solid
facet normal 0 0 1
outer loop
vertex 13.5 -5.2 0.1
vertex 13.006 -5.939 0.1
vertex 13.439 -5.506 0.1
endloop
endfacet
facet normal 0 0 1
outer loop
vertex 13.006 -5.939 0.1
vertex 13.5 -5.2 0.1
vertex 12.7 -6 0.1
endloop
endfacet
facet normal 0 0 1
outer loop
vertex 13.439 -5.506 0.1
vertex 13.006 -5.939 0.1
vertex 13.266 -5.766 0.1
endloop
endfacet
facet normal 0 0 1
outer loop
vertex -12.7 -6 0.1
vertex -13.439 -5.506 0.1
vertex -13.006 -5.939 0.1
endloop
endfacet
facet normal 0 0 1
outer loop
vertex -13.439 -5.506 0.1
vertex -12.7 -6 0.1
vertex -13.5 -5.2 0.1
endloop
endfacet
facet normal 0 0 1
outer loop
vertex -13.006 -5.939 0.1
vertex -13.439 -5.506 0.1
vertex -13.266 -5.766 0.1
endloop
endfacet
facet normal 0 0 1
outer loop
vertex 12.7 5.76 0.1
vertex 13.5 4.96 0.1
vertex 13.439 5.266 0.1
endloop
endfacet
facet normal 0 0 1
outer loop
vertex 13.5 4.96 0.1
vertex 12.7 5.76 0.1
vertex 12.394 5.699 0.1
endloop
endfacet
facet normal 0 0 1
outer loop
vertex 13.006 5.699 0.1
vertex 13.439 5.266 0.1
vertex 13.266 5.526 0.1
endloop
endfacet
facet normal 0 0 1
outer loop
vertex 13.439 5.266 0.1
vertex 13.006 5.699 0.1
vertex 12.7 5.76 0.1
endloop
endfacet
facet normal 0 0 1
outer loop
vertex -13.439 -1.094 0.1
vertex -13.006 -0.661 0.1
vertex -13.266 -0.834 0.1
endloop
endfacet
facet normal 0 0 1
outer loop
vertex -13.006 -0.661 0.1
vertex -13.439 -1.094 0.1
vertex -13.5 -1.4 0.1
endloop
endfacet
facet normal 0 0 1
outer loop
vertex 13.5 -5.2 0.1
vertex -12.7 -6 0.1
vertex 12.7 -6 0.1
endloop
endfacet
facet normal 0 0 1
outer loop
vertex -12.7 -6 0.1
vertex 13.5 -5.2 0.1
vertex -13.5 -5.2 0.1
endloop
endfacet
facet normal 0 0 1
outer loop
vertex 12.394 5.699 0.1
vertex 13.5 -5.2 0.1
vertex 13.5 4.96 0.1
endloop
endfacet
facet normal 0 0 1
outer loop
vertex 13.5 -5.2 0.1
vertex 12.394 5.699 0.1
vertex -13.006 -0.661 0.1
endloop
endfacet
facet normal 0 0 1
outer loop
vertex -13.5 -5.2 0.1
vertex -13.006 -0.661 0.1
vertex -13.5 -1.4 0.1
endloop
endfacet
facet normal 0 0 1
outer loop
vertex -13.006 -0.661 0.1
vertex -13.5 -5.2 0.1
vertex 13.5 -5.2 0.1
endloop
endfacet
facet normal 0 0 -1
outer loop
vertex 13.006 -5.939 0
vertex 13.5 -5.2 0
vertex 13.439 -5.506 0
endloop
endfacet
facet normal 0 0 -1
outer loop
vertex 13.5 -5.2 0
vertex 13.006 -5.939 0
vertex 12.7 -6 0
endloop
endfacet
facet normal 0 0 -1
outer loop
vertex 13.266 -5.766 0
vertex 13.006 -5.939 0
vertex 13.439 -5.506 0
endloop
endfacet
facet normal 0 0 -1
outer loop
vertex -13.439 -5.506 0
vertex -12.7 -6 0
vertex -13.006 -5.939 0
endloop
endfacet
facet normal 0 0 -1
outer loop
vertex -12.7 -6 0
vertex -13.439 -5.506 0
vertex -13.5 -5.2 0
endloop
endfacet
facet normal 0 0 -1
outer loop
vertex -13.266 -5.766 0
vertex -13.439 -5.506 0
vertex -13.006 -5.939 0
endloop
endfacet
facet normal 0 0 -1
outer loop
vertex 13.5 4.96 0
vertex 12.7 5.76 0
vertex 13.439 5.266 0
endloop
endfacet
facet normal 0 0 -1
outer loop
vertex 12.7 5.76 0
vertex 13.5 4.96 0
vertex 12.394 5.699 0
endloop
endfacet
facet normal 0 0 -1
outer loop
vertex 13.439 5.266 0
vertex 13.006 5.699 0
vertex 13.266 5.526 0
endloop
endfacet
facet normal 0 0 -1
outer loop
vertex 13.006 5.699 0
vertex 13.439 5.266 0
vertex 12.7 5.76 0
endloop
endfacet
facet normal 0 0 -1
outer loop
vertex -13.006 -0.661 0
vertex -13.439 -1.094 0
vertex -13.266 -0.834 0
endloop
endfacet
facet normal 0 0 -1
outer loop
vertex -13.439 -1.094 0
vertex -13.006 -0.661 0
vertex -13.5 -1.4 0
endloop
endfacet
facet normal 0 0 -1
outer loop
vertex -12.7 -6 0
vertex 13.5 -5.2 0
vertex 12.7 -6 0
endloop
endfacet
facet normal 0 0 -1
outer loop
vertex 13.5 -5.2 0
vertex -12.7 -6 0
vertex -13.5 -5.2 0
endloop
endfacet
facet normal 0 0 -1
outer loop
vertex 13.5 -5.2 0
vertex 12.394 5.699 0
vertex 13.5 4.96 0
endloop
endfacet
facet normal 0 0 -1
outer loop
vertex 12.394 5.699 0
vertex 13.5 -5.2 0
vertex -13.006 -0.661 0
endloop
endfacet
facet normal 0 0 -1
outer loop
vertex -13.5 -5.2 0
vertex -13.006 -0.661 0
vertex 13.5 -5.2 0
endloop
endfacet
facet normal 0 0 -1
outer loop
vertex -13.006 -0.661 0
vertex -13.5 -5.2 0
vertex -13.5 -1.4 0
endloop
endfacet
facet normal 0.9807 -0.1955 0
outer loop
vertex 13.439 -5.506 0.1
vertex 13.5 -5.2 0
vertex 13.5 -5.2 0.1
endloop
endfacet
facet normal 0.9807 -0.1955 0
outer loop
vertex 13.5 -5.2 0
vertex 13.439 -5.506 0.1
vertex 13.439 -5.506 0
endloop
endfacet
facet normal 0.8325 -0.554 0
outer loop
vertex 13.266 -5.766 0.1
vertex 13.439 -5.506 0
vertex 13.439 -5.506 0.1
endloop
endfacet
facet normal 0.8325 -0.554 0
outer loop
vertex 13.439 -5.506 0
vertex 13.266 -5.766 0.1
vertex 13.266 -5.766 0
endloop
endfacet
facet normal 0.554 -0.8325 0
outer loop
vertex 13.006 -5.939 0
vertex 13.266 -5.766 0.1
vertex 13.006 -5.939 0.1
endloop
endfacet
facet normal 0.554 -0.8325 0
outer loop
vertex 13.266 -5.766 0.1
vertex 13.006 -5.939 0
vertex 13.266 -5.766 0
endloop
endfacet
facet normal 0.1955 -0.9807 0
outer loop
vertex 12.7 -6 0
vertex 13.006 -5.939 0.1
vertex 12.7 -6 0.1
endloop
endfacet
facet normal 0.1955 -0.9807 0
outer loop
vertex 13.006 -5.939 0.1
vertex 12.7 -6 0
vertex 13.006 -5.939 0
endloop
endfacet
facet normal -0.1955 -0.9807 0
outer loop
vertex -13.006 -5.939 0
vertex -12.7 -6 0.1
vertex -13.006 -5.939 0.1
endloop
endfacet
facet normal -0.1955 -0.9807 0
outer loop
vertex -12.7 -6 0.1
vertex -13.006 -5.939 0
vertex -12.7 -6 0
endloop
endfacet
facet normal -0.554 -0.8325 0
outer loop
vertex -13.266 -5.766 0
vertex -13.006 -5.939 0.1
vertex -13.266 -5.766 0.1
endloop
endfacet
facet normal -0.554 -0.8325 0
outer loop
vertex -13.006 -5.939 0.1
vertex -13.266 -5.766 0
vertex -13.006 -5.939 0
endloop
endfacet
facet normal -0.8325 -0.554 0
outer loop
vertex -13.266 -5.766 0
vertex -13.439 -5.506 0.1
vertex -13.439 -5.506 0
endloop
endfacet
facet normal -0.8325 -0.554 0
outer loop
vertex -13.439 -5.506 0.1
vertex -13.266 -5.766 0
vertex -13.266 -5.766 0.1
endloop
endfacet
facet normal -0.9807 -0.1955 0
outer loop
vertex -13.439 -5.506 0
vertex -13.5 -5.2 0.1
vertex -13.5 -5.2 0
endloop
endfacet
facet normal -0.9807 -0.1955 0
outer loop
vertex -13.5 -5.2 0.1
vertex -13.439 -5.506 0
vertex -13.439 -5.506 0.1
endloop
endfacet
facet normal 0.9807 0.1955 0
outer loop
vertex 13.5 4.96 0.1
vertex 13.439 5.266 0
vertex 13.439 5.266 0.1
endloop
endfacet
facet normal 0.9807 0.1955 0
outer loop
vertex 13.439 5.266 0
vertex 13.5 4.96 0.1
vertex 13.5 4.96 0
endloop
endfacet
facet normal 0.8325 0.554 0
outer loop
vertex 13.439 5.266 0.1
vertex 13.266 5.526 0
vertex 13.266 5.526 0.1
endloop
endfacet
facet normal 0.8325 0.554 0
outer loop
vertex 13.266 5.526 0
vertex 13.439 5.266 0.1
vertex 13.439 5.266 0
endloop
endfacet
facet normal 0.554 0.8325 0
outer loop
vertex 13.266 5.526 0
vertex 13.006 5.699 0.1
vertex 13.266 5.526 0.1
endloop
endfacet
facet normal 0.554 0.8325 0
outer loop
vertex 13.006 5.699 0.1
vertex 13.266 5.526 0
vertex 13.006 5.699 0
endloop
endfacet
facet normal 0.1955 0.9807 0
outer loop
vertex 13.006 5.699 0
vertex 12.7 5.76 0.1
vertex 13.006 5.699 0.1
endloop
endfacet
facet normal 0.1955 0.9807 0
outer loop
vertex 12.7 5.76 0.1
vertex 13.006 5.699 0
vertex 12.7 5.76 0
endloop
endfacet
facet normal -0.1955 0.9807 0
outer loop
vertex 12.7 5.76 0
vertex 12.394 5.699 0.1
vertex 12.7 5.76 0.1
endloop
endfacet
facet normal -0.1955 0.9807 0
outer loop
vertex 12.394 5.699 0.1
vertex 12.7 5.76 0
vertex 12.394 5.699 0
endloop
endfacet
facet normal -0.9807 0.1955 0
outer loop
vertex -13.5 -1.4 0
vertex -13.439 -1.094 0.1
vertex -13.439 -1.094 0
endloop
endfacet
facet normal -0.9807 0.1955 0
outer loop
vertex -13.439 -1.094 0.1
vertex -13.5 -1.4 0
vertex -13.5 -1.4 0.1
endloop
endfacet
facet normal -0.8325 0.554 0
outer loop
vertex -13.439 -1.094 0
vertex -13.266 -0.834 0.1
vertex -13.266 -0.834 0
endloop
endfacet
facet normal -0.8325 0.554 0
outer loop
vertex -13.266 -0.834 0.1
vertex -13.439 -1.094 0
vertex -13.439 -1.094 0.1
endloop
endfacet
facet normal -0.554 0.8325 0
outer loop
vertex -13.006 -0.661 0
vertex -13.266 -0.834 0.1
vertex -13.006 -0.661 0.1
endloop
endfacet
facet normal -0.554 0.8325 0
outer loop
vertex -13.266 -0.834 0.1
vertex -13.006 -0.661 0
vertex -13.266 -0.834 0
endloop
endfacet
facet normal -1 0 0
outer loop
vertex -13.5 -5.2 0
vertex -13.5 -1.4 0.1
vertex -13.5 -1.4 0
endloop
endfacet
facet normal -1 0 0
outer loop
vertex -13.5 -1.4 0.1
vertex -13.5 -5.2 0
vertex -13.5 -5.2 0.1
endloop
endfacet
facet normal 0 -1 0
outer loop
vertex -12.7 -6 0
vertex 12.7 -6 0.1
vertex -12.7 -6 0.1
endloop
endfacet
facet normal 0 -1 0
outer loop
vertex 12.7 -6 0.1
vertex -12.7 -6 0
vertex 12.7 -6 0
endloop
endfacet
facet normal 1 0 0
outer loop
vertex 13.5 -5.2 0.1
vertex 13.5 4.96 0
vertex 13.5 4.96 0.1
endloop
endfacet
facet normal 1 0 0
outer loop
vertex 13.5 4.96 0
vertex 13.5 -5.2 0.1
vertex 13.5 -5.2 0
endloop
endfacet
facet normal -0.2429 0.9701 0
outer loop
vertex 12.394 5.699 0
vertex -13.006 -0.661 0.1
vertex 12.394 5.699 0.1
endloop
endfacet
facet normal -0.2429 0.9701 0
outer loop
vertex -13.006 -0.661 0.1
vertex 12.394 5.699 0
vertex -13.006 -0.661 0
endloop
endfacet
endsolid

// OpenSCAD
// file: ../p/5-16cyli.scad
use <../lib.scad>
function ldraw_lib__5_16cyli() = [
// 0 Cylinder 0.3125
// 0 Name: 5-16cyli.dat
// 0 Author: Philippe Hurbain [Philo]
// 0 !LDRAW_ORG Primitive UPDATE 2009-03
// 0 !LICENSE Licensed under CC BY 4.0 : see CAreadme.txt
// 
// 0 BFC CERTIFY CCW
  [0,"BFC","CERTIFY"],
  [0,"BFC","CCW"],
// 
// 0 !HISTORY 2009-12-29 [PTadmin] Official Update 2009-03
// 
// 
// 4 16 0.9239 0 0.3827 1 0 0 1 1 0 0.9239 1 0.3827
  [4,16,0.9239,0,0.3827,1,0,0,1,1,0,0.9239,1,0.3827],
// 4 16 0.7071 0 0.7071 0.9239 0 0.3827 0.9239 1 0.3827 0.7071 1 0.7071
  [4,16,0.7071,0,0.7071,0.9239,0,0.3827,0.9239,1,0.3827,0.7071,1,0.7071],
// 4 16 0.3827 0 0.9239 0.7071 0 0.7071 0.7071 1 0.7071 0.3827 1 0.9239
  [4,16,0.3827,0,0.9239,0.7071,0,0.7071,0.7071,1,0.7071,0.3827,1,0.9239],
// 4 16 0 0 1 0.3827 0 0.9239 0.3827 1 0.9239 0 1 1
  [4,16,0,0,1,0.3827,0,0.9239,0.3827,1,0.9239,0,1,1],
// 4 16 -0.3827 0 0.9239 0 0 1 0 1 1 -0.3827 1 0.9239
  [4,16,-0.3827,0,0.9239,0,0,1,0,1,1,-0.3827,1,0.9239],
// 
// 0 conditional lines
// 5 24 1 1 0 1 0 0 1 1 -0.4142 0.9239 1 0.3827
  [5,24,1,1,0,1,0,0,1,1,-0.4142,0.9239,1,0.3827],
// 5 24 0.9239 1 0.3827 0.9239 0 0.3827 1 1 0 0.7071 1 0.7071
  [5,24,0.9239,1,0.3827,0.9239,0,0.3827,1,1,0,0.7071,1,0.7071],
// 5 24 0.7071 1 0.7071 0.7071 0 0.7071 0.9239 1 0.3827 0.3827 1 0.9239
  [5,24,0.7071,1,0.7071,0.7071,0,0.7071,0.9239,1,0.3827,0.3827,1,0.9239],
// 5 24 0.3827 1 0.9239 0.3827 0 0.9239 0.7071 1 0.7071 0 1 1
  [5,24,0.3827,1,0.9239,0.3827,0,0.9239,0.7071,1,0.7071,0,1,1],
// 5 24 0 1 1 0 0 1 0.3827 1 0.9239 -0.3827 1 0.9239
  [5,24,0,1,1,0,0,1,0.3827,1,0.9239,-0.3827,1,0.9239],
// 5 24 -0.3827 1 0.9239 -0.3827 0 0.9239 0 1 1 -0.7654 1 0.7654
  [5,24,-0.3827,1,0.9239,-0.3827,0,0.9239,0,1,1,-0.7654,1,0.7654],
// 
// 0 end of file
// 
];
module ldraw_lib__5_16cyli(step=0, col=false, unit=2/5, alt=false, line=0.2, solid=!$preview)
    makepoly(ldraw_lib__5_16cyli(), step=step, col=col, unit=unit, alt=alt, line=line, solid=solid);
ldraw_lib__5_16cyli(line=0.2);
// file: ../p/5-16chrd.scad
use <../lib.scad>
function ldraw_lib__5_16chrd() = [
// 0 Chord 0.3125
// 0 Name: 5-16chrd.dat
// 0 Author: Niels Karsdorp [nielsk]
// 0 !LDRAW_ORG Primitive UPDATE 2010-01
// 0 !LICENSE Licensed under CC BY 4.0 : see CAreadme.txt
// 
// 0 BFC CERTIFY CCW
  [0,"BFC","CERTIFY"],
  [0,"BFC","CCW"],
// 
// 0 !HISTORY 2010-04-05 [PTadmin] Official Update 2010-01
// 
// 
// 4 16 1 0 0 0.9239 0 0.3827 0 0 1 -0.3827 0 0.9239
  [4,16,1,0,0,0.9239,0,0.3827,0,0,1,-0.3827,0,0.9239],
// 4 16 0.9239 0 0.3827 0.7071 0 0.7071 0.3827 0 0.9239 0 0 1
  [4,16,0.9239,0,0.3827,0.7071,0,0.7071,0.3827,0,0.9239,0,0,1],
// 0
// 
];
module ldraw_lib__5_16chrd(step=0, col=false, unit=2/5, alt=false, line=0.2, solid=!$preview)
    makepoly(ldraw_lib__5_16chrd(), step=step, col=col, unit=unit, alt=alt, line=line, solid=solid);
ldraw_lib__5_16chrd(line=0.2);
// file: ../p/3-16cyli.scad
use <../lib.scad>
function ldraw_lib__3_16cyli() = [
// 0 Cylinder 0.1875
// 0 Name: 3-16cyli.dat
// 0 Author: Mark Kennedy [mkennedy]
// 0 !LDRAW_ORG Primitive UPDATE 2005-01
// 0 !LICENSE Licensed under CC BY 4.0 : see CAreadme.txt
// 
// 0 BFC CERTIFY CCW
  [0,"BFC","CERTIFY"],
  [0,"BFC","CCW"],
// 
// 0 !HISTORY 2004-03-02 [PTadmin] Official Update 2004-01
// 0 !HISTORY 2004-12-11 [nielsk] Recreated using Primitive Generator, Edge lines fixed, BFC changed to CCW
// 0 !HISTORY 2005-12-28 [PTadmin] Official Update 2005-01
// 0 !HISTORY 2007-06-24 [PTadmin] Header formatted for Contributor Agreement
// 0 !HISTORY 2008-07-01 [PTadmin] Official Update 2008-01
// 
// 
// 4 16 .9239 1 .3827 .9239 0 .3827 1 0 0 1 1 0
  [4,16,.9239,1,.3827,.9239,0,.3827,1,0,0,1,1,0],
// 4 16 .7071 1 .7071 .7071 0 .7071 .9239 0 .3827 .9239 1 .3827
  [4,16,.7071,1,.7071,.7071,0,.7071,.9239,0,.3827,.9239,1,.3827],
// 4 16 .3827 1 .9239 .3827 0 .9239 .7071 0 .7071 .7071 1 .7071
  [4,16,.3827,1,.9239,.3827,0,.9239,.7071,0,.7071,.7071,1,.7071],
// 5 24 1 1 0 1 0 0 1 1 -.4142 .9239 1 .3827
  [5,24,1,1,0,1,0,0,1,1,-.4142,.9239,1,.3827],
// 5 24 .9239 1 .3827 .9239 0 .3827 1 1 0 .7071 1 .7071
  [5,24,.9239,1,.3827,.9239,0,.3827,1,1,0,.7071,1,.7071],
// 5 24 .7071 1 .7071 .7071 0 .7071 .9239 1 .3827 .3827 1 .9239
  [5,24,.7071,1,.7071,.7071,0,.7071,.9239,1,.3827,.3827,1,.9239],
// 5 24 .3827 1 .9239 .3827 0 .9239 .7071 1 .7071 0 1 1.0824
  [5,24,.3827,1,.9239,.3827,0,.9239,.7071,1,.7071,0,1,1.0824],
// 0
];
module ldraw_lib__3_16cyli(step=0, col=false, unit=2/5, alt=false, line=0.2, solid=!$preview)
    makepoly(ldraw_lib__3_16cyli(), step=step, col=col, unit=unit, alt=alt, line=line, solid=solid);
ldraw_lib__3_16cyli(line=0.2);
// file: ../p/3-16chrd.scad
use <../lib.scad>
function ldraw_lib__3_16chrd() = [
// 0 Chord 0.1875
// 0 Name: 3-16chrd.dat
// 0 Author: Niels Karsdorp [nielsk]
// 0 !LDRAW_ORG Primitive UPDATE 2009-01
// 0 !LICENSE Licensed under CC BY 4.0 : see CAreadme.txt
// 
// 0 BFC CERTIFY CCW
  [0,"BFC","CERTIFY"],
  [0,"BFC","CCW"],
// 
// 0 !HISTORY 2009-05-02 [PTadmin] Official Update 2009-01
// 
// 
// 4 16 1 0 0 0.9239 0 0.3827 0.7071 0 0.7071 0.3827 0 0.9239
  [4,16,1,0,0,0.9239,0,0.3827,0.7071,0,0.7071,0.3827,0,0.9239],
// 0
// 
];
module ldraw_lib__3_16chrd(step=0, col=false, unit=2/5, alt=false, line=0.2, solid=!$preview)
    makepoly(ldraw_lib__3_16chrd(), step=step, col=col, unit=unit, alt=alt, line=line, solid=solid);
ldraw_lib__3_16chrd(line=0.2);
// file: ../p/1-4cyli.scad
use <../lib.scad>
function ldraw_lib__1_4cyli() = [
// 0 Cylinder 0.25
// 0 Name: 1-4cyli.dat
// 0 Author: James Jessiman
// 0 !LDRAW_ORG Primitive UPDATE 2012-01
// 0 !LICENSE Licensed under CC BY 4.0 : see CAreadme.txt
// 
// 0 BFC CERTIFY CCW
  [0,"BFC","CERTIFY"],
  [0,"BFC","CCW"],
// 
// 0 !HISTORY 2002-03-23 [sbliss] Added BFC statement.
// 0 !HISTORY 2002-04-25 [PTadmin] Official Update 2002-02
// 0 !HISTORY 2007-06-22 [PTadmin] Header formatted for Contributor Agreement
// 0 !HISTORY 2008-07-01 [PTadmin] Official Update 2008-01
// 0 !HISTORY 2012-02-16 [Philo] Changed to CCW
// 0 !HISTORY 2012-03-30 [PTadmin] Official Update 2012-01
// 
// 
// 4 16 1 1 0 0.9239 1 0.3827 0.9239 0 0.3827 1 0 0
  [4,16,1,1,0,0.9239,1,0.3827,0.9239,0,0.3827,1,0,0],
// 5 24 1 0 0 1 1 0 0.9239 0 0.3827 1 0 -1
  [5,24,1,0,0,1,1,0,0.9239,0,0.3827,1,0,-1],
// 4 16 0.9239 1 0.3827 0.7071 1 0.7071 0.7071 0 0.7071 0.9239 0 0.3827
  [4,16,0.9239,1,0.3827,0.7071,1,0.7071,0.7071,0,0.7071,0.9239,0,0.3827],
// 5 24 0.9239 0 0.3827 0.9239 1 0.3827 0.7071 0 0.7071 1 0 0
  [5,24,0.9239,0,0.3827,0.9239,1,0.3827,0.7071,0,0.7071,1,0,0],
// 4 16 0.7071 1 0.7071 0.3827 1 0.9239 0.3827 0 0.9239 0.7071 0 0.7071
  [4,16,0.7071,1,0.7071,0.3827,1,0.9239,0.3827,0,0.9239,0.7071,0,0.7071],
// 5 24 0.7071 0 0.7071 0.7071 1 0.7071 0.3827 0 0.9239 0.9239 0 0.3827
  [5,24,0.7071,0,0.7071,0.7071,1,0.7071,0.3827,0,0.9239,0.9239,0,0.3827],
// 4 16 0.3827 1 0.9239 0 1 1 0 0 1 0.3827 0 0.9239
  [4,16,0.3827,1,0.9239,0,1,1,0,0,1,0.3827,0,0.9239],
// 5 24 0.3827 0 0.9239 0.3827 1 0.9239 0 0 1 0.7071 0 0.7071
  [5,24,0.3827,0,0.9239,0.3827,1,0.9239,0,0,1,0.7071,0,0.7071],
// 5 24 0 0 1 0 1 1 0.3827 0 0.9239 -1 0 1
  [5,24,0,0,1,0,1,1,0.3827,0,0.9239,-1,0,1],
];
module ldraw_lib__1_4cyli(step=0, col=false, unit=2/5, alt=false, line=0.2, solid=!$preview)
    makepoly(ldraw_lib__1_4cyli(), step=step, col=col, unit=unit, alt=alt, line=line, solid=solid);
ldraw_lib__1_4cyli(line=0.2);
// file: ../p/1-4chrd.scad
use <../lib.scad>
function ldraw_lib__1_4chrd() = [
// 0 Chord 0.25
// 0 Name: 1-4chrd.dat
// 0 Author: Max Martin Richter [MMR1988]
// 0 !LDRAW_ORG Primitive UPDATE 2023-05
// 0 !LICENSE Licensed under CC BY 4.0 : see CAreadme.txt
// 
// 0 BFC CERTIFY CCW
  [0,"BFC","CERTIFY"],
  [0,"BFC","CCW"],
// 
// 0 !HISTORY 2004-04-22 [PTadmin] Official Update 2004-02
// 0 !HISTORY 2007-10-09 [PTadmin] Header formatted for Contributor Agreement
// 0 !HISTORY 2008-07-01 [PTadmin] Official Update 2008-01
// 0 !HISTORY 2012-08-02 [MMR1988] Re-creation with PrimGen2 and Rectifier
// 0 !HISTORY 2012-08-09 [PTadmin] Official Update 2012-02
// 0 !HISTORY 2023-10-27 [OrionP] Change author to MMR1988 from hafhead
// 0 !HISTORY 2023-10-31 [OrionP] Official Update 2023-05
// 
// 4 16 0.9239 0 0.3827 0.3827 0 0.9239 0 0 1 1 0 0
  [4,16,0.9239,0,0.3827,0.3827,0,0.9239,0,0,1,1,0,0],
// 3 16 0.7071 0 0.7071 0.3827 0 0.9239 0.9239 0 0.3827
  [3,16,0.7071,0,0.7071,0.3827,0,0.9239,0.9239,0,0.3827],
];
module ldraw_lib__1_4chrd(step=0, col=false, unit=2/5, alt=false, line=0.2, solid=!$preview)
    makepoly(ldraw_lib__1_4chrd(), step=step, col=col, unit=unit, alt=alt, line=line, solid=solid);
ldraw_lib__1_4chrd(line=0.2);
// file: 4221407d.scad
use <../lib.scad>
use <../p/1-4chrd.scad>
use <../p/1-4cyli.scad>
use <../p/3-16chrd.scad>
use <../p/3-16cyli.scad>
use <../p/5-16chrd.scad>
use <../p/5-16cyli.scad>
function ldraw_lib__4221407d() = [
// 0 Sticker  1.5 x  3.3 Trapezoid Yellow Left
// 0 Name: 4221407d.dat
// 0 Author: Evert-Jan Boer [ejboer]
// 0 !LDRAW_ORG Part UPDATE 2024-08
// 0 !LICENSE Licensed under CC BY 4.0 : see CAreadme.txt
// 
// 0 BFC CERTIFY CCW
  [0,"BFC","CERTIFY"],
  [0,"BFC","CCW"],
// 
// 0 !KEYWORDS Set 10134, Star Wars, Y-Wing Starfighter
// 
// 0 !HISTORY 2024-09-30 [OrionP] Official Update 2024-08
// 
// 1 14 -31.75 -.25 -13 -2 0 0 0 1 0 0 0 -2 1-4chrd.dat
  [1,14,-31.75,-.25,-13,-2,0,0,0,1,0,0,0,-2, ldraw_lib__1_4chrd()],
// 1 14 31.75 -.25 -13 0 0 2 0 1 0 -2 0 0 1-4chrd.dat
  [1,14,31.75,-.25,-13,0,0,2,0,1,0,-2,0,0, ldraw_lib__1_4chrd()],
// 1 14 -31.75 -.25 12.4 -2 0 0 0 1 0 0 0 2 5-16chrd.dat
  [1,14,-31.75,-.25,12.4,-2,0,0,0,1,0,0,0,2, ldraw_lib__5_16chrd()],
// 1 14 31.75 -.25 -3.5 2 0 0 0 1 0 0 0 2 3-16chrd.dat
  [1,14,31.75,-.25,-3.5,2,0,0,0,1,0,0,0,2, ldraw_lib__3_16chrd()],
// 4 14 -31.75 -.25 -15 31.75 -.25 -15 33.75 -.25 -13 -33.75 -.25 -13
  [4,14,-31.75,-.25,-15,31.75,-.25,-15,33.75,-.25,-13,-33.75,-.25,-13],
// 4 14 32.5154 -.25 -1.6522 -30.9846 -.25 14.2478 -33.75 -.25 12.4 -33.75 -.25 -13
  [4,14,32.5154,-.25,-1.6522,-30.9846,-.25,14.2478,-33.75,-.25,12.4,-33.75,-.25,-13],
// 4 14 33.75 -.25 -3.5 32.5154 -.25 -1.6522 -33.75 -.25 -13 33.75 -.25 -13
  [4,14,33.75,-.25,-3.5,32.5154,-.25,-1.6522,-33.75,-.25,-13,33.75,-.25,-13],
// 
// 1 16 -31.75 0 -13 -2 0 0 0 -1 0 0 0 -2 1-4chrd.dat
  [1,16,-31.75,0,-13,-2,0,0,0,-1,0,0,0,-2, ldraw_lib__1_4chrd()],
// 1 16 31.75 0 -13 0 0 2 0 -1 0 -2 0 0 1-4chrd.dat
  [1,16,31.75,0,-13,0,0,2,0,-1,0,-2,0,0, ldraw_lib__1_4chrd()],
// 1 16 -31.75 0 12.4 -2 0 0 0 -1 0 0 0 2 5-16chrd.dat
  [1,16,-31.75,0,12.4,-2,0,0,0,-1,0,0,0,2, ldraw_lib__5_16chrd()],
// 1 16 31.75 0 -3.5 2 0 0 0 -1 0 0 0 2 3-16chrd.dat
  [1,16,31.75,0,-3.5,2,0,0,0,-1,0,0,0,2, ldraw_lib__3_16chrd()],
// 4 16 33.75 0 -13 31.75 0 -15 -31.75 0 -15 -33.75 0 -13
  [4,16,33.75,0,-13,31.75,0,-15,-31.75,0,-15,-33.75,0,-13],
// 4 16 32.5154 0 -1.6522 -33.75 0 -13 -33.75 0 12.4 -30.9846 0 14.2478
  [4,16,32.5154,0,-1.6522,-33.75,0,-13,-33.75,0,12.4,-30.9846,0,14.2478],
// 4 16 -33.75 0 -13 32.5154 0 -1.6522 33.75 0 -3.5 33.75 0 -13
  [4,16,-33.75,0,-13,32.5154,0,-1.6522,33.75,0,-3.5,33.75,0,-13],
// 
// 1 16 -31.75 -.25 -13 -2 0 0 0 .25 0 0 0 -2 1-4cyli.dat
  [1,16,-31.75,-.25,-13,-2,0,0,0,.25,0,0,0,-2, ldraw_lib__1_4cyli()],
// 1 16 31.75 -.25 -13 0 0 2 0 .25 0 -2 0 0 1-4cyli.dat
  [1,16,31.75,-.25,-13,0,0,2,0,.25,0,-2,0,0, ldraw_lib__1_4cyli()],
// 1 16 -31.75 -.25 12.4 -2 0 0 0 .25 0 0 0 2 5-16cyli.dat
  [1,16,-31.75,-.25,12.4,-2,0,0,0,.25,0,0,0,2, ldraw_lib__5_16cyli()],
// 1 16 31.75 -.25 -3.5 2 0 0 0 .25 0 0 0 2 3-16cyli.dat
  [1,16,31.75,-.25,-3.5,2,0,0,0,.25,0,0,0,2, ldraw_lib__3_16cyli()],
// 4 16 33.75 0 -3.5 33.75 -.25 -3.5 33.75 -.25 -13 33.75 0 -13
  [4,16,33.75,0,-3.5,33.75,-.25,-3.5,33.75,-.25,-13,33.75,0,-13],
// 4 16 31.75 0 -15 31.75 -.25 -15 -31.75 -.25 -15 -31.75 0 -15
  [4,16,31.75,0,-15,31.75,-.25,-15,-31.75,-.25,-15,-31.75,0,-15],
// 4 16 -33.75 0 -13 -33.75 -.25 -13 -33.75 -.25 12.4 -33.75 0 12.4
  [4,16,-33.75,0,-13,-33.75,-.25,-13,-33.75,-.25,12.4,-33.75,0,12.4],
// 4 16 -30.9846 0 14.2478 -30.9846 -.25 14.2478 32.5154 -.25 -1.6522 32.5154 0 -1.6522
  [4,16,-30.9846,0,14.2478,-30.9846,-.25,14.2478,32.5154,-.25,-1.6522,32.5154,0,-1.6522],
];
module ldraw_lib__4221407d(step=0, col=false, unit=2/5, alt=false, line=0.2, solid=!$preview)
    makepoly(ldraw_lib__4221407d(), step=step, col=col, unit=unit, alt=alt, line=line, solid=solid);
ldraw_lib__4221407d(line=0.2);
// main file
use <../lib.scad>
use <4221407d.scad>
function ldraw_lib__4221407e() = [
// 0 Sticker  1.5 x  3.3 Trapezoid Yellow Right
// 0 Name: 4221407e.dat
// 0 Author: Evert-Jan Boer [ejboer]
// 0 !LDRAW_ORG Part UPDATE 2024-08
// 0 !LICENSE Licensed under CC BY 4.0 : see CAreadme.txt
// 
// 0 BFC CERTIFY CCW
  [0,"BFC","CERTIFY"],
  [0,"BFC","CCW"],
// 
// 0 !KEYWORDS Set 10134, Star Wars, Y-Wing Starfighter
// 
// 0 !HISTORY 2024-09-30 [OrionP] Official Update 2024-08
// 
// 
// 1 16 0 0 0 -1 0 0 0 1 0 0 0 1 4221407d.dat
  [1,16,0,0,0,-1,0,0,0,1,0,0,0,1, ldraw_lib__4221407d()],
];
module ldraw_lib__4221407e(step=0, col=false, unit=2/5, alt=false, line=0.2, solid=!$preview)
    makepoly(ldraw_lib__4221407e(), step=step, col=col, unit=unit, alt=alt, line=line, solid=solid);
ldraw_lib__4221407e(line=0.2);
